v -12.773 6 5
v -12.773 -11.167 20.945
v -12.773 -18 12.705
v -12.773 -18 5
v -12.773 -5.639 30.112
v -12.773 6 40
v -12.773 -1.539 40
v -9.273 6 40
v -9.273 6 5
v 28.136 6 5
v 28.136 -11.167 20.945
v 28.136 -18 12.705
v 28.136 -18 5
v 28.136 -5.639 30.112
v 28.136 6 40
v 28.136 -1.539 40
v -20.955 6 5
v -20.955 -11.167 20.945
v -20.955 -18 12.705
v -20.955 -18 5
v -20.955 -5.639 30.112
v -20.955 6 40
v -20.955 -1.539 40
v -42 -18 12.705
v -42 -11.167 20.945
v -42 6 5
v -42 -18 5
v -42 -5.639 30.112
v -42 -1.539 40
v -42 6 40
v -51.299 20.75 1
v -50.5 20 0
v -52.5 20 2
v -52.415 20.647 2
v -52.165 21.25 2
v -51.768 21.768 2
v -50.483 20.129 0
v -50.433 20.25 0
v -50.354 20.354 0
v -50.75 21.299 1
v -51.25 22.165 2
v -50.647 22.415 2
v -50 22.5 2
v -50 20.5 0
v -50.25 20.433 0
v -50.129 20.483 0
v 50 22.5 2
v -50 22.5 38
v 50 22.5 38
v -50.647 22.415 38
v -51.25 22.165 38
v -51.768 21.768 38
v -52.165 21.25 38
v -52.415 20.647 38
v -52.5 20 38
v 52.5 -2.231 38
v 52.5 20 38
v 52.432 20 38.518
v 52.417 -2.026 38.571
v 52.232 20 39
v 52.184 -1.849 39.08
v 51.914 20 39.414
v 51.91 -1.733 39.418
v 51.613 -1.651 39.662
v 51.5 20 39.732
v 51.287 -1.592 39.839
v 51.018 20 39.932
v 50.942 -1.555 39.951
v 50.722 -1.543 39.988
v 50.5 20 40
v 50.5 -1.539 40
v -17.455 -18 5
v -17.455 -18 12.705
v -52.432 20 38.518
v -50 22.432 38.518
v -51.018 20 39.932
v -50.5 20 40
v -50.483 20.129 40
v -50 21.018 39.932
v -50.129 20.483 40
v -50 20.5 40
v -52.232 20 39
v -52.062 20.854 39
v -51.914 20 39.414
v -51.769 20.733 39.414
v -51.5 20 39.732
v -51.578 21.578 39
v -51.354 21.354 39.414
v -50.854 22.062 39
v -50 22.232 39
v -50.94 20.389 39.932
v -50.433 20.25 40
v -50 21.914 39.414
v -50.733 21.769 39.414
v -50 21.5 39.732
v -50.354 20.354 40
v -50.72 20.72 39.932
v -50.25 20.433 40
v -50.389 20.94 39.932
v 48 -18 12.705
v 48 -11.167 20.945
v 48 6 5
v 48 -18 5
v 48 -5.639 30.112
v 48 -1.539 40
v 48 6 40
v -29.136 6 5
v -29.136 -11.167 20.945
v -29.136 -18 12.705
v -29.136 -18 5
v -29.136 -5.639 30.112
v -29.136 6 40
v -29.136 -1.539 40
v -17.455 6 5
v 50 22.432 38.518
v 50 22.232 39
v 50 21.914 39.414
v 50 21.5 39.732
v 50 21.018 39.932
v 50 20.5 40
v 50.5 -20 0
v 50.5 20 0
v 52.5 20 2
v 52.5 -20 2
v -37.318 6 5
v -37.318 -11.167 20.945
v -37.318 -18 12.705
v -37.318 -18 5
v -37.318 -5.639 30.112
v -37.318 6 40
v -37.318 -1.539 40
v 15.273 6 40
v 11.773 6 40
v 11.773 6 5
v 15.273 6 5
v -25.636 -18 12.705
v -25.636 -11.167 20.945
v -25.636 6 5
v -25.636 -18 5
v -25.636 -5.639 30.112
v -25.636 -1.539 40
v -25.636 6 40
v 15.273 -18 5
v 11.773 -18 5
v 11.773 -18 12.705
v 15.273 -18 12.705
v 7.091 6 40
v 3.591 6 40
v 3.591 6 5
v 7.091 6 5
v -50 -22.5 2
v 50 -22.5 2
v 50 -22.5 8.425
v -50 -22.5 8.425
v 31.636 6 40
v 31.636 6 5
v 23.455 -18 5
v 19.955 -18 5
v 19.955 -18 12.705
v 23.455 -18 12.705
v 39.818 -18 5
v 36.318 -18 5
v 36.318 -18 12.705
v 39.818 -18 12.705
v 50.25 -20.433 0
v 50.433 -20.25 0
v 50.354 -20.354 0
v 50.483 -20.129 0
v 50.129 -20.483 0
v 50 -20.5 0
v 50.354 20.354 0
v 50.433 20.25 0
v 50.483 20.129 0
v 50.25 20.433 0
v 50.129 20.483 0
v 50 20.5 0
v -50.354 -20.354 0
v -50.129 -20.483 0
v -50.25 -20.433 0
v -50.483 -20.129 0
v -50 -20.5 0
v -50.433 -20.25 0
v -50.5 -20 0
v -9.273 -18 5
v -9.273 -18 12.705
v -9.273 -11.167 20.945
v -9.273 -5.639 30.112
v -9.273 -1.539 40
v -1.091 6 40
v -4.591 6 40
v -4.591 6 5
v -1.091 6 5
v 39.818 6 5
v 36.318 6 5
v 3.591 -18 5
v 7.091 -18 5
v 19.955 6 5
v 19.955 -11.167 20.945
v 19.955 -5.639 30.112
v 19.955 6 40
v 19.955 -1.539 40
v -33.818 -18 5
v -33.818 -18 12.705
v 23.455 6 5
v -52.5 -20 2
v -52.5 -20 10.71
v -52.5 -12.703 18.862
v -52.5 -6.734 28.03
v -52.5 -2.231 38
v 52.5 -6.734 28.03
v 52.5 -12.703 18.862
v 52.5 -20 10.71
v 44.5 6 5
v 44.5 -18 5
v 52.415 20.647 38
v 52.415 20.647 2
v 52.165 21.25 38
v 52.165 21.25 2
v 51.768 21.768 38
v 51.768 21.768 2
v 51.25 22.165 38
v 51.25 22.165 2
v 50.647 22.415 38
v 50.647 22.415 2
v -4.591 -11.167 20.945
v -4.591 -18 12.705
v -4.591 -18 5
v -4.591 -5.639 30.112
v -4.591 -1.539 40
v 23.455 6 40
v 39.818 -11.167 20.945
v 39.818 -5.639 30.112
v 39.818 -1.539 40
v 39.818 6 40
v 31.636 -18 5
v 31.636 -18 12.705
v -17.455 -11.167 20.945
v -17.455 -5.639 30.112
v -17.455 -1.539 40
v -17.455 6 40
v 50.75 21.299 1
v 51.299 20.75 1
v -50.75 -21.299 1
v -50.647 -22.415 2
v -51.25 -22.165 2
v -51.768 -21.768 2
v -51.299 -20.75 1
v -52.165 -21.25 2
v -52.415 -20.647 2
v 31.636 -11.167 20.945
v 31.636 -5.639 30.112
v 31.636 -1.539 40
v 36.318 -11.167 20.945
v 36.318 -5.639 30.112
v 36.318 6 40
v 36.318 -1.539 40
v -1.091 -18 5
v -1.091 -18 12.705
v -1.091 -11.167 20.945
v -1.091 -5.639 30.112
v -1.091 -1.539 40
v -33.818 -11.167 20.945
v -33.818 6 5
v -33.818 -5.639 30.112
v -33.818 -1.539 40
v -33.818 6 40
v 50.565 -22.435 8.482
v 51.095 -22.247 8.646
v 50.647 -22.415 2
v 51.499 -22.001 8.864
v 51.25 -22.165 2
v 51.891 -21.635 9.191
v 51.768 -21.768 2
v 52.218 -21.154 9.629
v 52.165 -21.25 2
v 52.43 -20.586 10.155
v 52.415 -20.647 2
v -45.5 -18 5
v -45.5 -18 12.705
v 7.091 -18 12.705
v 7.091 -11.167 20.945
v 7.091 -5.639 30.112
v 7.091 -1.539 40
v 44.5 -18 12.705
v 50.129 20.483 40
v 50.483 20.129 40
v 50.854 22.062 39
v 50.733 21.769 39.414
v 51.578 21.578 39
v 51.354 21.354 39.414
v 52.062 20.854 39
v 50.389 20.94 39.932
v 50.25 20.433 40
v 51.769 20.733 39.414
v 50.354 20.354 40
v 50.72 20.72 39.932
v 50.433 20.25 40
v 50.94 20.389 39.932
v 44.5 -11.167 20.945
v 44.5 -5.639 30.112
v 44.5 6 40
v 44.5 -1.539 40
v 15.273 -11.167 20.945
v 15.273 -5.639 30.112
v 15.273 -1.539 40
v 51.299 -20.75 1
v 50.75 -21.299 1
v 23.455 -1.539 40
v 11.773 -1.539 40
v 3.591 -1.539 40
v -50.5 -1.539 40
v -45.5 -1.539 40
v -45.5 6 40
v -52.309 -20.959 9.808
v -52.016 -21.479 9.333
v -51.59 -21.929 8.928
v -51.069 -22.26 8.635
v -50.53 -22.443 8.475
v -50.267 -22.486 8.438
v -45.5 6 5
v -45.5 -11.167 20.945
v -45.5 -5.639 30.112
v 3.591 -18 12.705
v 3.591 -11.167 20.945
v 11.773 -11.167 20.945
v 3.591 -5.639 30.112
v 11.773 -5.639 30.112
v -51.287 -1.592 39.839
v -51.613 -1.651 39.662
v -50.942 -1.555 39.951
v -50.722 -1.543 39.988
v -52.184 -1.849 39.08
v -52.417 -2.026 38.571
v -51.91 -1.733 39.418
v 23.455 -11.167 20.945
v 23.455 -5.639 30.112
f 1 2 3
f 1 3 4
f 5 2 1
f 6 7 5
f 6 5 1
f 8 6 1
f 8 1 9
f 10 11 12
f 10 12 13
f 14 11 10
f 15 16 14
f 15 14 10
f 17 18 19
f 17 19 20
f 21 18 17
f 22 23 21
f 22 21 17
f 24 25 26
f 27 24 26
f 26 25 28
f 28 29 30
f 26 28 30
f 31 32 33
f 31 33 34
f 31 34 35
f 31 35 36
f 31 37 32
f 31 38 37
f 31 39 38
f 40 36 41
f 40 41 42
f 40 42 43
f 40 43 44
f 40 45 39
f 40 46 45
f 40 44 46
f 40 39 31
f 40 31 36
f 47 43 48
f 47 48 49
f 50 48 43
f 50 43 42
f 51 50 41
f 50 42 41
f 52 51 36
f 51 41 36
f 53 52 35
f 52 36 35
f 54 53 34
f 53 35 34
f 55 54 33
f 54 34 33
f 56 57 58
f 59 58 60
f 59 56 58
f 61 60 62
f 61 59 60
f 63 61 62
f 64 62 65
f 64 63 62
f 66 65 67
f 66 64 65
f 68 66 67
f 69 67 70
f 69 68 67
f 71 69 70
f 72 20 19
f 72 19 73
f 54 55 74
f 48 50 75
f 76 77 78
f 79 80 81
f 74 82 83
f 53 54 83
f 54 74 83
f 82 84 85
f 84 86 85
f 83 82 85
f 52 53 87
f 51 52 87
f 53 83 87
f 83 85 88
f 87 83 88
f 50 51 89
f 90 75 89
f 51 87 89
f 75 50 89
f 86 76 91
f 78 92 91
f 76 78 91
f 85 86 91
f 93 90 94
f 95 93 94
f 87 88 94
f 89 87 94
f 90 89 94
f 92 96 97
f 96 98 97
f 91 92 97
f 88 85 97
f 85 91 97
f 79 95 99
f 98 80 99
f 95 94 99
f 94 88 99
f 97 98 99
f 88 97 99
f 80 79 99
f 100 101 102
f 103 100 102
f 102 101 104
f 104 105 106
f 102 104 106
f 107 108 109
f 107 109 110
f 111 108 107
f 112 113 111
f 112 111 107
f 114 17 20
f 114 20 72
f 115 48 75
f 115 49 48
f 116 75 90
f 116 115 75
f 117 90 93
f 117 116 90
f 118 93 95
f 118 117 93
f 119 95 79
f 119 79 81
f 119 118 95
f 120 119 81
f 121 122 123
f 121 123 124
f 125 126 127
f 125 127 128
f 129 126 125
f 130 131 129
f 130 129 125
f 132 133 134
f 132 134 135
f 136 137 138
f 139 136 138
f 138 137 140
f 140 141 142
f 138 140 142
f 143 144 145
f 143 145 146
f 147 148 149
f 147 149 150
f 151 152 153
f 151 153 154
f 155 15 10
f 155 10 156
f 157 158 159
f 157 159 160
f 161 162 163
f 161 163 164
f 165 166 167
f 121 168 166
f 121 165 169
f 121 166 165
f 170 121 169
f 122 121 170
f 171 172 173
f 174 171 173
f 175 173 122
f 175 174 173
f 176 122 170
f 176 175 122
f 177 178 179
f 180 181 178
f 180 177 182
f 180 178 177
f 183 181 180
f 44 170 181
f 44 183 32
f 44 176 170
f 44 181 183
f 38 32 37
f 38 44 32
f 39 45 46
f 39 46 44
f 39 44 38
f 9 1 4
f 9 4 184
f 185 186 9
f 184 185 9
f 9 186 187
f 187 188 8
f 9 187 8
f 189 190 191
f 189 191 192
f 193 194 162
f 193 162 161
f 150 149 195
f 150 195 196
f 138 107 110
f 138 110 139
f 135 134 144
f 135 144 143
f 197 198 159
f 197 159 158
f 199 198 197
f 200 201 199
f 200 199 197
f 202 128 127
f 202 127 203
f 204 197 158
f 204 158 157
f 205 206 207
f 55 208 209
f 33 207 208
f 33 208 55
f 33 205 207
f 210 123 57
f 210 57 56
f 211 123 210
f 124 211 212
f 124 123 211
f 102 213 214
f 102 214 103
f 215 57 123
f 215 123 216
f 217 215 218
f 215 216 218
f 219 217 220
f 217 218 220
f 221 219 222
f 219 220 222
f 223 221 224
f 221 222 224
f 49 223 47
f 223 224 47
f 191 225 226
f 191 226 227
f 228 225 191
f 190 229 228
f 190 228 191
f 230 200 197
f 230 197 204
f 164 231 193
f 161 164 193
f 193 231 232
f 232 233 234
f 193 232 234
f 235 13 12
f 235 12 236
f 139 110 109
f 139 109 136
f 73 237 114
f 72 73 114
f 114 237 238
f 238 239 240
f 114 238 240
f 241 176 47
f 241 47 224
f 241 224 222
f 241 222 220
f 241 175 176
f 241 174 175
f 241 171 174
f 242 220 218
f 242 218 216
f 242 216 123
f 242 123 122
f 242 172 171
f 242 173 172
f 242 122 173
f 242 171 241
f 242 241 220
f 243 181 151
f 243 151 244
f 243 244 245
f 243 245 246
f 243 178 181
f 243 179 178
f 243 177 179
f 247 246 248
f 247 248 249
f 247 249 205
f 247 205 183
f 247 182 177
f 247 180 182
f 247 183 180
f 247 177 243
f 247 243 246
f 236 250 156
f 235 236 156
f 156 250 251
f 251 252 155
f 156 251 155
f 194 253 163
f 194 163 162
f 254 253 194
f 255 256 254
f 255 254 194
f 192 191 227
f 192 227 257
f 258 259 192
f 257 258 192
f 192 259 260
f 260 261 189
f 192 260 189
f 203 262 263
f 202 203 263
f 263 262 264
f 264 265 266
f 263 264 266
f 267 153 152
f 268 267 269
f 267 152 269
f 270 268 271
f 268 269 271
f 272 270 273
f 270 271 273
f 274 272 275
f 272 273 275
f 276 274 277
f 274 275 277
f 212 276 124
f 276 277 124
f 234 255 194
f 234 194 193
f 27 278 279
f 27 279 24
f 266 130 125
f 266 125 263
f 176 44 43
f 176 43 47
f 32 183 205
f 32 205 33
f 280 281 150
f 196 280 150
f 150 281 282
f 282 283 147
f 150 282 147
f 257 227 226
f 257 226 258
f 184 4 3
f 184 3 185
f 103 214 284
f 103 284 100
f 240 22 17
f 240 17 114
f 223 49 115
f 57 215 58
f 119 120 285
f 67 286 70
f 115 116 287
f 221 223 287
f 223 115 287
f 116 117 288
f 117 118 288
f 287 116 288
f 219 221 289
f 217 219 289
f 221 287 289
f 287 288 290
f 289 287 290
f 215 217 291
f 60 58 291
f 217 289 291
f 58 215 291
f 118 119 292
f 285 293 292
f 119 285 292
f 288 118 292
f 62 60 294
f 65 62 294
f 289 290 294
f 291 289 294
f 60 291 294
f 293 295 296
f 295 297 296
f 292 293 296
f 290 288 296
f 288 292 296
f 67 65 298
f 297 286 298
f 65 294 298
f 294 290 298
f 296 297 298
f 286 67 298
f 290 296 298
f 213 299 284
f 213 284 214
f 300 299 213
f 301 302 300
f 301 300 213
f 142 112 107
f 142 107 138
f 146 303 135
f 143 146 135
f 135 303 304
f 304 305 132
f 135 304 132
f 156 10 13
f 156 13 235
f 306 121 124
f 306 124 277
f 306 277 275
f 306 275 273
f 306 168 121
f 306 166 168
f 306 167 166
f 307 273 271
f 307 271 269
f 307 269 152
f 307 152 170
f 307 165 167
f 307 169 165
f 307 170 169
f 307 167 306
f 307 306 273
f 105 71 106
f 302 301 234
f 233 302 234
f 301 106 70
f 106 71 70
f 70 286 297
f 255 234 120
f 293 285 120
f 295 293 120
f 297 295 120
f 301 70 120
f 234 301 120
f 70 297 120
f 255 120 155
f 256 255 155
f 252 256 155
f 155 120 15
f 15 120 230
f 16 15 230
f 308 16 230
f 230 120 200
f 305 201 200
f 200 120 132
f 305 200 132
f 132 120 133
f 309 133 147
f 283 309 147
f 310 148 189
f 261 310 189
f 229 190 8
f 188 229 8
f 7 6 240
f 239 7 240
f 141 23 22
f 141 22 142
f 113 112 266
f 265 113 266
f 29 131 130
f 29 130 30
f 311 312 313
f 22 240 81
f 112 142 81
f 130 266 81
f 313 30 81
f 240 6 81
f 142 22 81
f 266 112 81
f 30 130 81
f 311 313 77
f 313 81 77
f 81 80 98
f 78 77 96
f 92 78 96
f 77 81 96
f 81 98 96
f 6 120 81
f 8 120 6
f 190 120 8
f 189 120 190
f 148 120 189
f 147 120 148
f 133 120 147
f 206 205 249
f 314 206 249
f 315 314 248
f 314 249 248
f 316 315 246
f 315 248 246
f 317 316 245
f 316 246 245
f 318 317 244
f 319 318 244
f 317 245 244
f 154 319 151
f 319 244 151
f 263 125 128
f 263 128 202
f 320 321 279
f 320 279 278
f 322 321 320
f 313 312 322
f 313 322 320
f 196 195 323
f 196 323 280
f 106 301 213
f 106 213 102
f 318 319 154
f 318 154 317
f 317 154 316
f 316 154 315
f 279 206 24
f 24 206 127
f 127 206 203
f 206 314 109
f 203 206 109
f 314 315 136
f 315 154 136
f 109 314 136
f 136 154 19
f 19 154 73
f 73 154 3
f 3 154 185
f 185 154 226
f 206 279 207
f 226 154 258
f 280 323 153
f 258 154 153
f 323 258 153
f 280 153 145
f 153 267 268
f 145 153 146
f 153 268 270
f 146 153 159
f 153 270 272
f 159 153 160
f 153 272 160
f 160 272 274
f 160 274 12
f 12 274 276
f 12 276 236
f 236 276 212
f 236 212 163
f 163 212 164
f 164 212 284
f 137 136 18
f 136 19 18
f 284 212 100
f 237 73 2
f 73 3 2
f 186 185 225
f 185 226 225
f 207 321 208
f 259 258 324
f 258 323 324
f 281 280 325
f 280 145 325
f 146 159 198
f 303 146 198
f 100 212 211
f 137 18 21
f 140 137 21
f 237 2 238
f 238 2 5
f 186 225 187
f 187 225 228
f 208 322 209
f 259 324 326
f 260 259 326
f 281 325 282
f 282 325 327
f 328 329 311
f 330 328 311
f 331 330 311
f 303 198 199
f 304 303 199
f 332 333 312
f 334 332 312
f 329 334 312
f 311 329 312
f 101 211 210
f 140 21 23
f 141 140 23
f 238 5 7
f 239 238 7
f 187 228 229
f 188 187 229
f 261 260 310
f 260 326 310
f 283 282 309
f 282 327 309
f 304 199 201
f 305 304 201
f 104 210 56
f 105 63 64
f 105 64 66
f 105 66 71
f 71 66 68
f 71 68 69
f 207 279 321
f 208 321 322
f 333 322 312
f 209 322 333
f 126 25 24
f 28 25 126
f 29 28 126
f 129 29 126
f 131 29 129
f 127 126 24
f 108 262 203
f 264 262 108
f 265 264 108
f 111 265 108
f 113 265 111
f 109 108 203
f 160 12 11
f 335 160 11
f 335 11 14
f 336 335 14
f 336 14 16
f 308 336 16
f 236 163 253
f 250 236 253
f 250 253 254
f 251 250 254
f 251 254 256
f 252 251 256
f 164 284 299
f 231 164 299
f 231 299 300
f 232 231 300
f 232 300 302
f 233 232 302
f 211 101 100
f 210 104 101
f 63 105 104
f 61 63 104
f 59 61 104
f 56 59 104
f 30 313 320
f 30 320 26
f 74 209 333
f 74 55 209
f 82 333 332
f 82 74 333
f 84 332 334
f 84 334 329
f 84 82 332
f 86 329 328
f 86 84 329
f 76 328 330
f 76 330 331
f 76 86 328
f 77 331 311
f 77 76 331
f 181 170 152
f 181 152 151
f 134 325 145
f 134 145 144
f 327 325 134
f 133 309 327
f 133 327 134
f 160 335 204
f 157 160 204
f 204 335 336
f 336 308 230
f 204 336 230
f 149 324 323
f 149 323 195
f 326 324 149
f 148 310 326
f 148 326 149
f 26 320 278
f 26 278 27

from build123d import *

# Parameters (mm, degrees)
PAD_DEPTH           = 40
POCKET_DEPTH        = 105.001
SKETCH002_W         = 3.5
SKETCH002_H         = 24
POCKET001_DEPTH     = 35
LINEARPATTERN_COUNT = 12
LINEARPATTERN_PITCH = 8.181818
FILLET_R            = 2
CHAMFER_SIZE        = 2


with BuildPart() as part:
    # Sketch → Pad (new body)
    with BuildSketch(Plane.XY):
        with BuildLine():
            Line((-50, 22.5), (50, 22.5))
            ThreePointArc((52.5, 20), (51.767767, 21.767767), (50, 22.5))
            Line((52.5, 20), (52.5, -20))
            ThreePointArc((50, -22.5), (51.767767, -21.767767), (52.5, -20))
            Line((50, -22.5), (-50, -22.5))
            ThreePointArc((-52.5, -20), (-51.767767, -21.767767), (-50, -22.5))
            Line((-52.5, -20), (-52.5, 20))
            ThreePointArc((-50, 22.5), (-51.767767, 21.767767), (-52.5, 20))
        make_face()
    extrude(amount=PAD_DEPTH)

    # Sketch001 (on Face5 of Pad) → Pocket (cut, through all)
    with BuildSketch(Plane.YZ.offset(52.5)):
        with BuildLine():
            ThreePointArc((-34.433893, 0), (-12.512323, 19.11251), (0, 45.366749))
            Line((0, 45.366749), (-64.611679, 45.366749))
            Line((-64.611679, 45.366749), (-64.611679, 0))
            Line((-64.611679, 0), (-34.433893, 0))
        make_face()
    extrude(amount=-POCKET_DEPTH, mode=Mode.SUBTRACT)

    # Sketch002 (on Face4 of Pocket) → Pocket001 (cut)
    with BuildSketch(Plane.XY.offset(40)):
        with Locations((-43.75, -6)):
            Rectangle(SKETCH002_W, SKETCH002_H)
    pocket001 = extrude(amount=-POCKET001_DEPTH, mode=Mode.SUBTRACT)

    # LinearPattern: Pocket001 ×12
    with Locations(*[(i * LINEARPATTERN_PITCH, 0, 0) for i in range(1, LINEARPATTERN_COUNT)]):
        add(pocket001, mode=Mode.SUBTRACT)

    # Fillet
    fillet_edges = [part.edges().sort_by_distance(p)[0] for p in [
        (0, 22.5, 40),
    ]]
    fillet(fillet_edges, radius=FILLET_R)

    # Chamfer
    chamfer_edges = [part.edges().sort_by_distance(p)[0] for p in [
        (-50, 22.5, 19),
        (0, 22.5, 38),
        (0, 22.5, 0),
        (50, 22.5, 19),
        (-52.5, 0, 0),
        (-51.767767, 21.767767, 0),
        (51.767767, 21.767767, 0),
        (52.5, 0, 0),
        (51.767767, -21.767767, 0),
        (0, -22.5, 0),
        (-51.767767, -21.767767, 0),
    ]]
    chamfer(chamfer_edges, length=CHAMFER_SIZE)


solid = part.part
